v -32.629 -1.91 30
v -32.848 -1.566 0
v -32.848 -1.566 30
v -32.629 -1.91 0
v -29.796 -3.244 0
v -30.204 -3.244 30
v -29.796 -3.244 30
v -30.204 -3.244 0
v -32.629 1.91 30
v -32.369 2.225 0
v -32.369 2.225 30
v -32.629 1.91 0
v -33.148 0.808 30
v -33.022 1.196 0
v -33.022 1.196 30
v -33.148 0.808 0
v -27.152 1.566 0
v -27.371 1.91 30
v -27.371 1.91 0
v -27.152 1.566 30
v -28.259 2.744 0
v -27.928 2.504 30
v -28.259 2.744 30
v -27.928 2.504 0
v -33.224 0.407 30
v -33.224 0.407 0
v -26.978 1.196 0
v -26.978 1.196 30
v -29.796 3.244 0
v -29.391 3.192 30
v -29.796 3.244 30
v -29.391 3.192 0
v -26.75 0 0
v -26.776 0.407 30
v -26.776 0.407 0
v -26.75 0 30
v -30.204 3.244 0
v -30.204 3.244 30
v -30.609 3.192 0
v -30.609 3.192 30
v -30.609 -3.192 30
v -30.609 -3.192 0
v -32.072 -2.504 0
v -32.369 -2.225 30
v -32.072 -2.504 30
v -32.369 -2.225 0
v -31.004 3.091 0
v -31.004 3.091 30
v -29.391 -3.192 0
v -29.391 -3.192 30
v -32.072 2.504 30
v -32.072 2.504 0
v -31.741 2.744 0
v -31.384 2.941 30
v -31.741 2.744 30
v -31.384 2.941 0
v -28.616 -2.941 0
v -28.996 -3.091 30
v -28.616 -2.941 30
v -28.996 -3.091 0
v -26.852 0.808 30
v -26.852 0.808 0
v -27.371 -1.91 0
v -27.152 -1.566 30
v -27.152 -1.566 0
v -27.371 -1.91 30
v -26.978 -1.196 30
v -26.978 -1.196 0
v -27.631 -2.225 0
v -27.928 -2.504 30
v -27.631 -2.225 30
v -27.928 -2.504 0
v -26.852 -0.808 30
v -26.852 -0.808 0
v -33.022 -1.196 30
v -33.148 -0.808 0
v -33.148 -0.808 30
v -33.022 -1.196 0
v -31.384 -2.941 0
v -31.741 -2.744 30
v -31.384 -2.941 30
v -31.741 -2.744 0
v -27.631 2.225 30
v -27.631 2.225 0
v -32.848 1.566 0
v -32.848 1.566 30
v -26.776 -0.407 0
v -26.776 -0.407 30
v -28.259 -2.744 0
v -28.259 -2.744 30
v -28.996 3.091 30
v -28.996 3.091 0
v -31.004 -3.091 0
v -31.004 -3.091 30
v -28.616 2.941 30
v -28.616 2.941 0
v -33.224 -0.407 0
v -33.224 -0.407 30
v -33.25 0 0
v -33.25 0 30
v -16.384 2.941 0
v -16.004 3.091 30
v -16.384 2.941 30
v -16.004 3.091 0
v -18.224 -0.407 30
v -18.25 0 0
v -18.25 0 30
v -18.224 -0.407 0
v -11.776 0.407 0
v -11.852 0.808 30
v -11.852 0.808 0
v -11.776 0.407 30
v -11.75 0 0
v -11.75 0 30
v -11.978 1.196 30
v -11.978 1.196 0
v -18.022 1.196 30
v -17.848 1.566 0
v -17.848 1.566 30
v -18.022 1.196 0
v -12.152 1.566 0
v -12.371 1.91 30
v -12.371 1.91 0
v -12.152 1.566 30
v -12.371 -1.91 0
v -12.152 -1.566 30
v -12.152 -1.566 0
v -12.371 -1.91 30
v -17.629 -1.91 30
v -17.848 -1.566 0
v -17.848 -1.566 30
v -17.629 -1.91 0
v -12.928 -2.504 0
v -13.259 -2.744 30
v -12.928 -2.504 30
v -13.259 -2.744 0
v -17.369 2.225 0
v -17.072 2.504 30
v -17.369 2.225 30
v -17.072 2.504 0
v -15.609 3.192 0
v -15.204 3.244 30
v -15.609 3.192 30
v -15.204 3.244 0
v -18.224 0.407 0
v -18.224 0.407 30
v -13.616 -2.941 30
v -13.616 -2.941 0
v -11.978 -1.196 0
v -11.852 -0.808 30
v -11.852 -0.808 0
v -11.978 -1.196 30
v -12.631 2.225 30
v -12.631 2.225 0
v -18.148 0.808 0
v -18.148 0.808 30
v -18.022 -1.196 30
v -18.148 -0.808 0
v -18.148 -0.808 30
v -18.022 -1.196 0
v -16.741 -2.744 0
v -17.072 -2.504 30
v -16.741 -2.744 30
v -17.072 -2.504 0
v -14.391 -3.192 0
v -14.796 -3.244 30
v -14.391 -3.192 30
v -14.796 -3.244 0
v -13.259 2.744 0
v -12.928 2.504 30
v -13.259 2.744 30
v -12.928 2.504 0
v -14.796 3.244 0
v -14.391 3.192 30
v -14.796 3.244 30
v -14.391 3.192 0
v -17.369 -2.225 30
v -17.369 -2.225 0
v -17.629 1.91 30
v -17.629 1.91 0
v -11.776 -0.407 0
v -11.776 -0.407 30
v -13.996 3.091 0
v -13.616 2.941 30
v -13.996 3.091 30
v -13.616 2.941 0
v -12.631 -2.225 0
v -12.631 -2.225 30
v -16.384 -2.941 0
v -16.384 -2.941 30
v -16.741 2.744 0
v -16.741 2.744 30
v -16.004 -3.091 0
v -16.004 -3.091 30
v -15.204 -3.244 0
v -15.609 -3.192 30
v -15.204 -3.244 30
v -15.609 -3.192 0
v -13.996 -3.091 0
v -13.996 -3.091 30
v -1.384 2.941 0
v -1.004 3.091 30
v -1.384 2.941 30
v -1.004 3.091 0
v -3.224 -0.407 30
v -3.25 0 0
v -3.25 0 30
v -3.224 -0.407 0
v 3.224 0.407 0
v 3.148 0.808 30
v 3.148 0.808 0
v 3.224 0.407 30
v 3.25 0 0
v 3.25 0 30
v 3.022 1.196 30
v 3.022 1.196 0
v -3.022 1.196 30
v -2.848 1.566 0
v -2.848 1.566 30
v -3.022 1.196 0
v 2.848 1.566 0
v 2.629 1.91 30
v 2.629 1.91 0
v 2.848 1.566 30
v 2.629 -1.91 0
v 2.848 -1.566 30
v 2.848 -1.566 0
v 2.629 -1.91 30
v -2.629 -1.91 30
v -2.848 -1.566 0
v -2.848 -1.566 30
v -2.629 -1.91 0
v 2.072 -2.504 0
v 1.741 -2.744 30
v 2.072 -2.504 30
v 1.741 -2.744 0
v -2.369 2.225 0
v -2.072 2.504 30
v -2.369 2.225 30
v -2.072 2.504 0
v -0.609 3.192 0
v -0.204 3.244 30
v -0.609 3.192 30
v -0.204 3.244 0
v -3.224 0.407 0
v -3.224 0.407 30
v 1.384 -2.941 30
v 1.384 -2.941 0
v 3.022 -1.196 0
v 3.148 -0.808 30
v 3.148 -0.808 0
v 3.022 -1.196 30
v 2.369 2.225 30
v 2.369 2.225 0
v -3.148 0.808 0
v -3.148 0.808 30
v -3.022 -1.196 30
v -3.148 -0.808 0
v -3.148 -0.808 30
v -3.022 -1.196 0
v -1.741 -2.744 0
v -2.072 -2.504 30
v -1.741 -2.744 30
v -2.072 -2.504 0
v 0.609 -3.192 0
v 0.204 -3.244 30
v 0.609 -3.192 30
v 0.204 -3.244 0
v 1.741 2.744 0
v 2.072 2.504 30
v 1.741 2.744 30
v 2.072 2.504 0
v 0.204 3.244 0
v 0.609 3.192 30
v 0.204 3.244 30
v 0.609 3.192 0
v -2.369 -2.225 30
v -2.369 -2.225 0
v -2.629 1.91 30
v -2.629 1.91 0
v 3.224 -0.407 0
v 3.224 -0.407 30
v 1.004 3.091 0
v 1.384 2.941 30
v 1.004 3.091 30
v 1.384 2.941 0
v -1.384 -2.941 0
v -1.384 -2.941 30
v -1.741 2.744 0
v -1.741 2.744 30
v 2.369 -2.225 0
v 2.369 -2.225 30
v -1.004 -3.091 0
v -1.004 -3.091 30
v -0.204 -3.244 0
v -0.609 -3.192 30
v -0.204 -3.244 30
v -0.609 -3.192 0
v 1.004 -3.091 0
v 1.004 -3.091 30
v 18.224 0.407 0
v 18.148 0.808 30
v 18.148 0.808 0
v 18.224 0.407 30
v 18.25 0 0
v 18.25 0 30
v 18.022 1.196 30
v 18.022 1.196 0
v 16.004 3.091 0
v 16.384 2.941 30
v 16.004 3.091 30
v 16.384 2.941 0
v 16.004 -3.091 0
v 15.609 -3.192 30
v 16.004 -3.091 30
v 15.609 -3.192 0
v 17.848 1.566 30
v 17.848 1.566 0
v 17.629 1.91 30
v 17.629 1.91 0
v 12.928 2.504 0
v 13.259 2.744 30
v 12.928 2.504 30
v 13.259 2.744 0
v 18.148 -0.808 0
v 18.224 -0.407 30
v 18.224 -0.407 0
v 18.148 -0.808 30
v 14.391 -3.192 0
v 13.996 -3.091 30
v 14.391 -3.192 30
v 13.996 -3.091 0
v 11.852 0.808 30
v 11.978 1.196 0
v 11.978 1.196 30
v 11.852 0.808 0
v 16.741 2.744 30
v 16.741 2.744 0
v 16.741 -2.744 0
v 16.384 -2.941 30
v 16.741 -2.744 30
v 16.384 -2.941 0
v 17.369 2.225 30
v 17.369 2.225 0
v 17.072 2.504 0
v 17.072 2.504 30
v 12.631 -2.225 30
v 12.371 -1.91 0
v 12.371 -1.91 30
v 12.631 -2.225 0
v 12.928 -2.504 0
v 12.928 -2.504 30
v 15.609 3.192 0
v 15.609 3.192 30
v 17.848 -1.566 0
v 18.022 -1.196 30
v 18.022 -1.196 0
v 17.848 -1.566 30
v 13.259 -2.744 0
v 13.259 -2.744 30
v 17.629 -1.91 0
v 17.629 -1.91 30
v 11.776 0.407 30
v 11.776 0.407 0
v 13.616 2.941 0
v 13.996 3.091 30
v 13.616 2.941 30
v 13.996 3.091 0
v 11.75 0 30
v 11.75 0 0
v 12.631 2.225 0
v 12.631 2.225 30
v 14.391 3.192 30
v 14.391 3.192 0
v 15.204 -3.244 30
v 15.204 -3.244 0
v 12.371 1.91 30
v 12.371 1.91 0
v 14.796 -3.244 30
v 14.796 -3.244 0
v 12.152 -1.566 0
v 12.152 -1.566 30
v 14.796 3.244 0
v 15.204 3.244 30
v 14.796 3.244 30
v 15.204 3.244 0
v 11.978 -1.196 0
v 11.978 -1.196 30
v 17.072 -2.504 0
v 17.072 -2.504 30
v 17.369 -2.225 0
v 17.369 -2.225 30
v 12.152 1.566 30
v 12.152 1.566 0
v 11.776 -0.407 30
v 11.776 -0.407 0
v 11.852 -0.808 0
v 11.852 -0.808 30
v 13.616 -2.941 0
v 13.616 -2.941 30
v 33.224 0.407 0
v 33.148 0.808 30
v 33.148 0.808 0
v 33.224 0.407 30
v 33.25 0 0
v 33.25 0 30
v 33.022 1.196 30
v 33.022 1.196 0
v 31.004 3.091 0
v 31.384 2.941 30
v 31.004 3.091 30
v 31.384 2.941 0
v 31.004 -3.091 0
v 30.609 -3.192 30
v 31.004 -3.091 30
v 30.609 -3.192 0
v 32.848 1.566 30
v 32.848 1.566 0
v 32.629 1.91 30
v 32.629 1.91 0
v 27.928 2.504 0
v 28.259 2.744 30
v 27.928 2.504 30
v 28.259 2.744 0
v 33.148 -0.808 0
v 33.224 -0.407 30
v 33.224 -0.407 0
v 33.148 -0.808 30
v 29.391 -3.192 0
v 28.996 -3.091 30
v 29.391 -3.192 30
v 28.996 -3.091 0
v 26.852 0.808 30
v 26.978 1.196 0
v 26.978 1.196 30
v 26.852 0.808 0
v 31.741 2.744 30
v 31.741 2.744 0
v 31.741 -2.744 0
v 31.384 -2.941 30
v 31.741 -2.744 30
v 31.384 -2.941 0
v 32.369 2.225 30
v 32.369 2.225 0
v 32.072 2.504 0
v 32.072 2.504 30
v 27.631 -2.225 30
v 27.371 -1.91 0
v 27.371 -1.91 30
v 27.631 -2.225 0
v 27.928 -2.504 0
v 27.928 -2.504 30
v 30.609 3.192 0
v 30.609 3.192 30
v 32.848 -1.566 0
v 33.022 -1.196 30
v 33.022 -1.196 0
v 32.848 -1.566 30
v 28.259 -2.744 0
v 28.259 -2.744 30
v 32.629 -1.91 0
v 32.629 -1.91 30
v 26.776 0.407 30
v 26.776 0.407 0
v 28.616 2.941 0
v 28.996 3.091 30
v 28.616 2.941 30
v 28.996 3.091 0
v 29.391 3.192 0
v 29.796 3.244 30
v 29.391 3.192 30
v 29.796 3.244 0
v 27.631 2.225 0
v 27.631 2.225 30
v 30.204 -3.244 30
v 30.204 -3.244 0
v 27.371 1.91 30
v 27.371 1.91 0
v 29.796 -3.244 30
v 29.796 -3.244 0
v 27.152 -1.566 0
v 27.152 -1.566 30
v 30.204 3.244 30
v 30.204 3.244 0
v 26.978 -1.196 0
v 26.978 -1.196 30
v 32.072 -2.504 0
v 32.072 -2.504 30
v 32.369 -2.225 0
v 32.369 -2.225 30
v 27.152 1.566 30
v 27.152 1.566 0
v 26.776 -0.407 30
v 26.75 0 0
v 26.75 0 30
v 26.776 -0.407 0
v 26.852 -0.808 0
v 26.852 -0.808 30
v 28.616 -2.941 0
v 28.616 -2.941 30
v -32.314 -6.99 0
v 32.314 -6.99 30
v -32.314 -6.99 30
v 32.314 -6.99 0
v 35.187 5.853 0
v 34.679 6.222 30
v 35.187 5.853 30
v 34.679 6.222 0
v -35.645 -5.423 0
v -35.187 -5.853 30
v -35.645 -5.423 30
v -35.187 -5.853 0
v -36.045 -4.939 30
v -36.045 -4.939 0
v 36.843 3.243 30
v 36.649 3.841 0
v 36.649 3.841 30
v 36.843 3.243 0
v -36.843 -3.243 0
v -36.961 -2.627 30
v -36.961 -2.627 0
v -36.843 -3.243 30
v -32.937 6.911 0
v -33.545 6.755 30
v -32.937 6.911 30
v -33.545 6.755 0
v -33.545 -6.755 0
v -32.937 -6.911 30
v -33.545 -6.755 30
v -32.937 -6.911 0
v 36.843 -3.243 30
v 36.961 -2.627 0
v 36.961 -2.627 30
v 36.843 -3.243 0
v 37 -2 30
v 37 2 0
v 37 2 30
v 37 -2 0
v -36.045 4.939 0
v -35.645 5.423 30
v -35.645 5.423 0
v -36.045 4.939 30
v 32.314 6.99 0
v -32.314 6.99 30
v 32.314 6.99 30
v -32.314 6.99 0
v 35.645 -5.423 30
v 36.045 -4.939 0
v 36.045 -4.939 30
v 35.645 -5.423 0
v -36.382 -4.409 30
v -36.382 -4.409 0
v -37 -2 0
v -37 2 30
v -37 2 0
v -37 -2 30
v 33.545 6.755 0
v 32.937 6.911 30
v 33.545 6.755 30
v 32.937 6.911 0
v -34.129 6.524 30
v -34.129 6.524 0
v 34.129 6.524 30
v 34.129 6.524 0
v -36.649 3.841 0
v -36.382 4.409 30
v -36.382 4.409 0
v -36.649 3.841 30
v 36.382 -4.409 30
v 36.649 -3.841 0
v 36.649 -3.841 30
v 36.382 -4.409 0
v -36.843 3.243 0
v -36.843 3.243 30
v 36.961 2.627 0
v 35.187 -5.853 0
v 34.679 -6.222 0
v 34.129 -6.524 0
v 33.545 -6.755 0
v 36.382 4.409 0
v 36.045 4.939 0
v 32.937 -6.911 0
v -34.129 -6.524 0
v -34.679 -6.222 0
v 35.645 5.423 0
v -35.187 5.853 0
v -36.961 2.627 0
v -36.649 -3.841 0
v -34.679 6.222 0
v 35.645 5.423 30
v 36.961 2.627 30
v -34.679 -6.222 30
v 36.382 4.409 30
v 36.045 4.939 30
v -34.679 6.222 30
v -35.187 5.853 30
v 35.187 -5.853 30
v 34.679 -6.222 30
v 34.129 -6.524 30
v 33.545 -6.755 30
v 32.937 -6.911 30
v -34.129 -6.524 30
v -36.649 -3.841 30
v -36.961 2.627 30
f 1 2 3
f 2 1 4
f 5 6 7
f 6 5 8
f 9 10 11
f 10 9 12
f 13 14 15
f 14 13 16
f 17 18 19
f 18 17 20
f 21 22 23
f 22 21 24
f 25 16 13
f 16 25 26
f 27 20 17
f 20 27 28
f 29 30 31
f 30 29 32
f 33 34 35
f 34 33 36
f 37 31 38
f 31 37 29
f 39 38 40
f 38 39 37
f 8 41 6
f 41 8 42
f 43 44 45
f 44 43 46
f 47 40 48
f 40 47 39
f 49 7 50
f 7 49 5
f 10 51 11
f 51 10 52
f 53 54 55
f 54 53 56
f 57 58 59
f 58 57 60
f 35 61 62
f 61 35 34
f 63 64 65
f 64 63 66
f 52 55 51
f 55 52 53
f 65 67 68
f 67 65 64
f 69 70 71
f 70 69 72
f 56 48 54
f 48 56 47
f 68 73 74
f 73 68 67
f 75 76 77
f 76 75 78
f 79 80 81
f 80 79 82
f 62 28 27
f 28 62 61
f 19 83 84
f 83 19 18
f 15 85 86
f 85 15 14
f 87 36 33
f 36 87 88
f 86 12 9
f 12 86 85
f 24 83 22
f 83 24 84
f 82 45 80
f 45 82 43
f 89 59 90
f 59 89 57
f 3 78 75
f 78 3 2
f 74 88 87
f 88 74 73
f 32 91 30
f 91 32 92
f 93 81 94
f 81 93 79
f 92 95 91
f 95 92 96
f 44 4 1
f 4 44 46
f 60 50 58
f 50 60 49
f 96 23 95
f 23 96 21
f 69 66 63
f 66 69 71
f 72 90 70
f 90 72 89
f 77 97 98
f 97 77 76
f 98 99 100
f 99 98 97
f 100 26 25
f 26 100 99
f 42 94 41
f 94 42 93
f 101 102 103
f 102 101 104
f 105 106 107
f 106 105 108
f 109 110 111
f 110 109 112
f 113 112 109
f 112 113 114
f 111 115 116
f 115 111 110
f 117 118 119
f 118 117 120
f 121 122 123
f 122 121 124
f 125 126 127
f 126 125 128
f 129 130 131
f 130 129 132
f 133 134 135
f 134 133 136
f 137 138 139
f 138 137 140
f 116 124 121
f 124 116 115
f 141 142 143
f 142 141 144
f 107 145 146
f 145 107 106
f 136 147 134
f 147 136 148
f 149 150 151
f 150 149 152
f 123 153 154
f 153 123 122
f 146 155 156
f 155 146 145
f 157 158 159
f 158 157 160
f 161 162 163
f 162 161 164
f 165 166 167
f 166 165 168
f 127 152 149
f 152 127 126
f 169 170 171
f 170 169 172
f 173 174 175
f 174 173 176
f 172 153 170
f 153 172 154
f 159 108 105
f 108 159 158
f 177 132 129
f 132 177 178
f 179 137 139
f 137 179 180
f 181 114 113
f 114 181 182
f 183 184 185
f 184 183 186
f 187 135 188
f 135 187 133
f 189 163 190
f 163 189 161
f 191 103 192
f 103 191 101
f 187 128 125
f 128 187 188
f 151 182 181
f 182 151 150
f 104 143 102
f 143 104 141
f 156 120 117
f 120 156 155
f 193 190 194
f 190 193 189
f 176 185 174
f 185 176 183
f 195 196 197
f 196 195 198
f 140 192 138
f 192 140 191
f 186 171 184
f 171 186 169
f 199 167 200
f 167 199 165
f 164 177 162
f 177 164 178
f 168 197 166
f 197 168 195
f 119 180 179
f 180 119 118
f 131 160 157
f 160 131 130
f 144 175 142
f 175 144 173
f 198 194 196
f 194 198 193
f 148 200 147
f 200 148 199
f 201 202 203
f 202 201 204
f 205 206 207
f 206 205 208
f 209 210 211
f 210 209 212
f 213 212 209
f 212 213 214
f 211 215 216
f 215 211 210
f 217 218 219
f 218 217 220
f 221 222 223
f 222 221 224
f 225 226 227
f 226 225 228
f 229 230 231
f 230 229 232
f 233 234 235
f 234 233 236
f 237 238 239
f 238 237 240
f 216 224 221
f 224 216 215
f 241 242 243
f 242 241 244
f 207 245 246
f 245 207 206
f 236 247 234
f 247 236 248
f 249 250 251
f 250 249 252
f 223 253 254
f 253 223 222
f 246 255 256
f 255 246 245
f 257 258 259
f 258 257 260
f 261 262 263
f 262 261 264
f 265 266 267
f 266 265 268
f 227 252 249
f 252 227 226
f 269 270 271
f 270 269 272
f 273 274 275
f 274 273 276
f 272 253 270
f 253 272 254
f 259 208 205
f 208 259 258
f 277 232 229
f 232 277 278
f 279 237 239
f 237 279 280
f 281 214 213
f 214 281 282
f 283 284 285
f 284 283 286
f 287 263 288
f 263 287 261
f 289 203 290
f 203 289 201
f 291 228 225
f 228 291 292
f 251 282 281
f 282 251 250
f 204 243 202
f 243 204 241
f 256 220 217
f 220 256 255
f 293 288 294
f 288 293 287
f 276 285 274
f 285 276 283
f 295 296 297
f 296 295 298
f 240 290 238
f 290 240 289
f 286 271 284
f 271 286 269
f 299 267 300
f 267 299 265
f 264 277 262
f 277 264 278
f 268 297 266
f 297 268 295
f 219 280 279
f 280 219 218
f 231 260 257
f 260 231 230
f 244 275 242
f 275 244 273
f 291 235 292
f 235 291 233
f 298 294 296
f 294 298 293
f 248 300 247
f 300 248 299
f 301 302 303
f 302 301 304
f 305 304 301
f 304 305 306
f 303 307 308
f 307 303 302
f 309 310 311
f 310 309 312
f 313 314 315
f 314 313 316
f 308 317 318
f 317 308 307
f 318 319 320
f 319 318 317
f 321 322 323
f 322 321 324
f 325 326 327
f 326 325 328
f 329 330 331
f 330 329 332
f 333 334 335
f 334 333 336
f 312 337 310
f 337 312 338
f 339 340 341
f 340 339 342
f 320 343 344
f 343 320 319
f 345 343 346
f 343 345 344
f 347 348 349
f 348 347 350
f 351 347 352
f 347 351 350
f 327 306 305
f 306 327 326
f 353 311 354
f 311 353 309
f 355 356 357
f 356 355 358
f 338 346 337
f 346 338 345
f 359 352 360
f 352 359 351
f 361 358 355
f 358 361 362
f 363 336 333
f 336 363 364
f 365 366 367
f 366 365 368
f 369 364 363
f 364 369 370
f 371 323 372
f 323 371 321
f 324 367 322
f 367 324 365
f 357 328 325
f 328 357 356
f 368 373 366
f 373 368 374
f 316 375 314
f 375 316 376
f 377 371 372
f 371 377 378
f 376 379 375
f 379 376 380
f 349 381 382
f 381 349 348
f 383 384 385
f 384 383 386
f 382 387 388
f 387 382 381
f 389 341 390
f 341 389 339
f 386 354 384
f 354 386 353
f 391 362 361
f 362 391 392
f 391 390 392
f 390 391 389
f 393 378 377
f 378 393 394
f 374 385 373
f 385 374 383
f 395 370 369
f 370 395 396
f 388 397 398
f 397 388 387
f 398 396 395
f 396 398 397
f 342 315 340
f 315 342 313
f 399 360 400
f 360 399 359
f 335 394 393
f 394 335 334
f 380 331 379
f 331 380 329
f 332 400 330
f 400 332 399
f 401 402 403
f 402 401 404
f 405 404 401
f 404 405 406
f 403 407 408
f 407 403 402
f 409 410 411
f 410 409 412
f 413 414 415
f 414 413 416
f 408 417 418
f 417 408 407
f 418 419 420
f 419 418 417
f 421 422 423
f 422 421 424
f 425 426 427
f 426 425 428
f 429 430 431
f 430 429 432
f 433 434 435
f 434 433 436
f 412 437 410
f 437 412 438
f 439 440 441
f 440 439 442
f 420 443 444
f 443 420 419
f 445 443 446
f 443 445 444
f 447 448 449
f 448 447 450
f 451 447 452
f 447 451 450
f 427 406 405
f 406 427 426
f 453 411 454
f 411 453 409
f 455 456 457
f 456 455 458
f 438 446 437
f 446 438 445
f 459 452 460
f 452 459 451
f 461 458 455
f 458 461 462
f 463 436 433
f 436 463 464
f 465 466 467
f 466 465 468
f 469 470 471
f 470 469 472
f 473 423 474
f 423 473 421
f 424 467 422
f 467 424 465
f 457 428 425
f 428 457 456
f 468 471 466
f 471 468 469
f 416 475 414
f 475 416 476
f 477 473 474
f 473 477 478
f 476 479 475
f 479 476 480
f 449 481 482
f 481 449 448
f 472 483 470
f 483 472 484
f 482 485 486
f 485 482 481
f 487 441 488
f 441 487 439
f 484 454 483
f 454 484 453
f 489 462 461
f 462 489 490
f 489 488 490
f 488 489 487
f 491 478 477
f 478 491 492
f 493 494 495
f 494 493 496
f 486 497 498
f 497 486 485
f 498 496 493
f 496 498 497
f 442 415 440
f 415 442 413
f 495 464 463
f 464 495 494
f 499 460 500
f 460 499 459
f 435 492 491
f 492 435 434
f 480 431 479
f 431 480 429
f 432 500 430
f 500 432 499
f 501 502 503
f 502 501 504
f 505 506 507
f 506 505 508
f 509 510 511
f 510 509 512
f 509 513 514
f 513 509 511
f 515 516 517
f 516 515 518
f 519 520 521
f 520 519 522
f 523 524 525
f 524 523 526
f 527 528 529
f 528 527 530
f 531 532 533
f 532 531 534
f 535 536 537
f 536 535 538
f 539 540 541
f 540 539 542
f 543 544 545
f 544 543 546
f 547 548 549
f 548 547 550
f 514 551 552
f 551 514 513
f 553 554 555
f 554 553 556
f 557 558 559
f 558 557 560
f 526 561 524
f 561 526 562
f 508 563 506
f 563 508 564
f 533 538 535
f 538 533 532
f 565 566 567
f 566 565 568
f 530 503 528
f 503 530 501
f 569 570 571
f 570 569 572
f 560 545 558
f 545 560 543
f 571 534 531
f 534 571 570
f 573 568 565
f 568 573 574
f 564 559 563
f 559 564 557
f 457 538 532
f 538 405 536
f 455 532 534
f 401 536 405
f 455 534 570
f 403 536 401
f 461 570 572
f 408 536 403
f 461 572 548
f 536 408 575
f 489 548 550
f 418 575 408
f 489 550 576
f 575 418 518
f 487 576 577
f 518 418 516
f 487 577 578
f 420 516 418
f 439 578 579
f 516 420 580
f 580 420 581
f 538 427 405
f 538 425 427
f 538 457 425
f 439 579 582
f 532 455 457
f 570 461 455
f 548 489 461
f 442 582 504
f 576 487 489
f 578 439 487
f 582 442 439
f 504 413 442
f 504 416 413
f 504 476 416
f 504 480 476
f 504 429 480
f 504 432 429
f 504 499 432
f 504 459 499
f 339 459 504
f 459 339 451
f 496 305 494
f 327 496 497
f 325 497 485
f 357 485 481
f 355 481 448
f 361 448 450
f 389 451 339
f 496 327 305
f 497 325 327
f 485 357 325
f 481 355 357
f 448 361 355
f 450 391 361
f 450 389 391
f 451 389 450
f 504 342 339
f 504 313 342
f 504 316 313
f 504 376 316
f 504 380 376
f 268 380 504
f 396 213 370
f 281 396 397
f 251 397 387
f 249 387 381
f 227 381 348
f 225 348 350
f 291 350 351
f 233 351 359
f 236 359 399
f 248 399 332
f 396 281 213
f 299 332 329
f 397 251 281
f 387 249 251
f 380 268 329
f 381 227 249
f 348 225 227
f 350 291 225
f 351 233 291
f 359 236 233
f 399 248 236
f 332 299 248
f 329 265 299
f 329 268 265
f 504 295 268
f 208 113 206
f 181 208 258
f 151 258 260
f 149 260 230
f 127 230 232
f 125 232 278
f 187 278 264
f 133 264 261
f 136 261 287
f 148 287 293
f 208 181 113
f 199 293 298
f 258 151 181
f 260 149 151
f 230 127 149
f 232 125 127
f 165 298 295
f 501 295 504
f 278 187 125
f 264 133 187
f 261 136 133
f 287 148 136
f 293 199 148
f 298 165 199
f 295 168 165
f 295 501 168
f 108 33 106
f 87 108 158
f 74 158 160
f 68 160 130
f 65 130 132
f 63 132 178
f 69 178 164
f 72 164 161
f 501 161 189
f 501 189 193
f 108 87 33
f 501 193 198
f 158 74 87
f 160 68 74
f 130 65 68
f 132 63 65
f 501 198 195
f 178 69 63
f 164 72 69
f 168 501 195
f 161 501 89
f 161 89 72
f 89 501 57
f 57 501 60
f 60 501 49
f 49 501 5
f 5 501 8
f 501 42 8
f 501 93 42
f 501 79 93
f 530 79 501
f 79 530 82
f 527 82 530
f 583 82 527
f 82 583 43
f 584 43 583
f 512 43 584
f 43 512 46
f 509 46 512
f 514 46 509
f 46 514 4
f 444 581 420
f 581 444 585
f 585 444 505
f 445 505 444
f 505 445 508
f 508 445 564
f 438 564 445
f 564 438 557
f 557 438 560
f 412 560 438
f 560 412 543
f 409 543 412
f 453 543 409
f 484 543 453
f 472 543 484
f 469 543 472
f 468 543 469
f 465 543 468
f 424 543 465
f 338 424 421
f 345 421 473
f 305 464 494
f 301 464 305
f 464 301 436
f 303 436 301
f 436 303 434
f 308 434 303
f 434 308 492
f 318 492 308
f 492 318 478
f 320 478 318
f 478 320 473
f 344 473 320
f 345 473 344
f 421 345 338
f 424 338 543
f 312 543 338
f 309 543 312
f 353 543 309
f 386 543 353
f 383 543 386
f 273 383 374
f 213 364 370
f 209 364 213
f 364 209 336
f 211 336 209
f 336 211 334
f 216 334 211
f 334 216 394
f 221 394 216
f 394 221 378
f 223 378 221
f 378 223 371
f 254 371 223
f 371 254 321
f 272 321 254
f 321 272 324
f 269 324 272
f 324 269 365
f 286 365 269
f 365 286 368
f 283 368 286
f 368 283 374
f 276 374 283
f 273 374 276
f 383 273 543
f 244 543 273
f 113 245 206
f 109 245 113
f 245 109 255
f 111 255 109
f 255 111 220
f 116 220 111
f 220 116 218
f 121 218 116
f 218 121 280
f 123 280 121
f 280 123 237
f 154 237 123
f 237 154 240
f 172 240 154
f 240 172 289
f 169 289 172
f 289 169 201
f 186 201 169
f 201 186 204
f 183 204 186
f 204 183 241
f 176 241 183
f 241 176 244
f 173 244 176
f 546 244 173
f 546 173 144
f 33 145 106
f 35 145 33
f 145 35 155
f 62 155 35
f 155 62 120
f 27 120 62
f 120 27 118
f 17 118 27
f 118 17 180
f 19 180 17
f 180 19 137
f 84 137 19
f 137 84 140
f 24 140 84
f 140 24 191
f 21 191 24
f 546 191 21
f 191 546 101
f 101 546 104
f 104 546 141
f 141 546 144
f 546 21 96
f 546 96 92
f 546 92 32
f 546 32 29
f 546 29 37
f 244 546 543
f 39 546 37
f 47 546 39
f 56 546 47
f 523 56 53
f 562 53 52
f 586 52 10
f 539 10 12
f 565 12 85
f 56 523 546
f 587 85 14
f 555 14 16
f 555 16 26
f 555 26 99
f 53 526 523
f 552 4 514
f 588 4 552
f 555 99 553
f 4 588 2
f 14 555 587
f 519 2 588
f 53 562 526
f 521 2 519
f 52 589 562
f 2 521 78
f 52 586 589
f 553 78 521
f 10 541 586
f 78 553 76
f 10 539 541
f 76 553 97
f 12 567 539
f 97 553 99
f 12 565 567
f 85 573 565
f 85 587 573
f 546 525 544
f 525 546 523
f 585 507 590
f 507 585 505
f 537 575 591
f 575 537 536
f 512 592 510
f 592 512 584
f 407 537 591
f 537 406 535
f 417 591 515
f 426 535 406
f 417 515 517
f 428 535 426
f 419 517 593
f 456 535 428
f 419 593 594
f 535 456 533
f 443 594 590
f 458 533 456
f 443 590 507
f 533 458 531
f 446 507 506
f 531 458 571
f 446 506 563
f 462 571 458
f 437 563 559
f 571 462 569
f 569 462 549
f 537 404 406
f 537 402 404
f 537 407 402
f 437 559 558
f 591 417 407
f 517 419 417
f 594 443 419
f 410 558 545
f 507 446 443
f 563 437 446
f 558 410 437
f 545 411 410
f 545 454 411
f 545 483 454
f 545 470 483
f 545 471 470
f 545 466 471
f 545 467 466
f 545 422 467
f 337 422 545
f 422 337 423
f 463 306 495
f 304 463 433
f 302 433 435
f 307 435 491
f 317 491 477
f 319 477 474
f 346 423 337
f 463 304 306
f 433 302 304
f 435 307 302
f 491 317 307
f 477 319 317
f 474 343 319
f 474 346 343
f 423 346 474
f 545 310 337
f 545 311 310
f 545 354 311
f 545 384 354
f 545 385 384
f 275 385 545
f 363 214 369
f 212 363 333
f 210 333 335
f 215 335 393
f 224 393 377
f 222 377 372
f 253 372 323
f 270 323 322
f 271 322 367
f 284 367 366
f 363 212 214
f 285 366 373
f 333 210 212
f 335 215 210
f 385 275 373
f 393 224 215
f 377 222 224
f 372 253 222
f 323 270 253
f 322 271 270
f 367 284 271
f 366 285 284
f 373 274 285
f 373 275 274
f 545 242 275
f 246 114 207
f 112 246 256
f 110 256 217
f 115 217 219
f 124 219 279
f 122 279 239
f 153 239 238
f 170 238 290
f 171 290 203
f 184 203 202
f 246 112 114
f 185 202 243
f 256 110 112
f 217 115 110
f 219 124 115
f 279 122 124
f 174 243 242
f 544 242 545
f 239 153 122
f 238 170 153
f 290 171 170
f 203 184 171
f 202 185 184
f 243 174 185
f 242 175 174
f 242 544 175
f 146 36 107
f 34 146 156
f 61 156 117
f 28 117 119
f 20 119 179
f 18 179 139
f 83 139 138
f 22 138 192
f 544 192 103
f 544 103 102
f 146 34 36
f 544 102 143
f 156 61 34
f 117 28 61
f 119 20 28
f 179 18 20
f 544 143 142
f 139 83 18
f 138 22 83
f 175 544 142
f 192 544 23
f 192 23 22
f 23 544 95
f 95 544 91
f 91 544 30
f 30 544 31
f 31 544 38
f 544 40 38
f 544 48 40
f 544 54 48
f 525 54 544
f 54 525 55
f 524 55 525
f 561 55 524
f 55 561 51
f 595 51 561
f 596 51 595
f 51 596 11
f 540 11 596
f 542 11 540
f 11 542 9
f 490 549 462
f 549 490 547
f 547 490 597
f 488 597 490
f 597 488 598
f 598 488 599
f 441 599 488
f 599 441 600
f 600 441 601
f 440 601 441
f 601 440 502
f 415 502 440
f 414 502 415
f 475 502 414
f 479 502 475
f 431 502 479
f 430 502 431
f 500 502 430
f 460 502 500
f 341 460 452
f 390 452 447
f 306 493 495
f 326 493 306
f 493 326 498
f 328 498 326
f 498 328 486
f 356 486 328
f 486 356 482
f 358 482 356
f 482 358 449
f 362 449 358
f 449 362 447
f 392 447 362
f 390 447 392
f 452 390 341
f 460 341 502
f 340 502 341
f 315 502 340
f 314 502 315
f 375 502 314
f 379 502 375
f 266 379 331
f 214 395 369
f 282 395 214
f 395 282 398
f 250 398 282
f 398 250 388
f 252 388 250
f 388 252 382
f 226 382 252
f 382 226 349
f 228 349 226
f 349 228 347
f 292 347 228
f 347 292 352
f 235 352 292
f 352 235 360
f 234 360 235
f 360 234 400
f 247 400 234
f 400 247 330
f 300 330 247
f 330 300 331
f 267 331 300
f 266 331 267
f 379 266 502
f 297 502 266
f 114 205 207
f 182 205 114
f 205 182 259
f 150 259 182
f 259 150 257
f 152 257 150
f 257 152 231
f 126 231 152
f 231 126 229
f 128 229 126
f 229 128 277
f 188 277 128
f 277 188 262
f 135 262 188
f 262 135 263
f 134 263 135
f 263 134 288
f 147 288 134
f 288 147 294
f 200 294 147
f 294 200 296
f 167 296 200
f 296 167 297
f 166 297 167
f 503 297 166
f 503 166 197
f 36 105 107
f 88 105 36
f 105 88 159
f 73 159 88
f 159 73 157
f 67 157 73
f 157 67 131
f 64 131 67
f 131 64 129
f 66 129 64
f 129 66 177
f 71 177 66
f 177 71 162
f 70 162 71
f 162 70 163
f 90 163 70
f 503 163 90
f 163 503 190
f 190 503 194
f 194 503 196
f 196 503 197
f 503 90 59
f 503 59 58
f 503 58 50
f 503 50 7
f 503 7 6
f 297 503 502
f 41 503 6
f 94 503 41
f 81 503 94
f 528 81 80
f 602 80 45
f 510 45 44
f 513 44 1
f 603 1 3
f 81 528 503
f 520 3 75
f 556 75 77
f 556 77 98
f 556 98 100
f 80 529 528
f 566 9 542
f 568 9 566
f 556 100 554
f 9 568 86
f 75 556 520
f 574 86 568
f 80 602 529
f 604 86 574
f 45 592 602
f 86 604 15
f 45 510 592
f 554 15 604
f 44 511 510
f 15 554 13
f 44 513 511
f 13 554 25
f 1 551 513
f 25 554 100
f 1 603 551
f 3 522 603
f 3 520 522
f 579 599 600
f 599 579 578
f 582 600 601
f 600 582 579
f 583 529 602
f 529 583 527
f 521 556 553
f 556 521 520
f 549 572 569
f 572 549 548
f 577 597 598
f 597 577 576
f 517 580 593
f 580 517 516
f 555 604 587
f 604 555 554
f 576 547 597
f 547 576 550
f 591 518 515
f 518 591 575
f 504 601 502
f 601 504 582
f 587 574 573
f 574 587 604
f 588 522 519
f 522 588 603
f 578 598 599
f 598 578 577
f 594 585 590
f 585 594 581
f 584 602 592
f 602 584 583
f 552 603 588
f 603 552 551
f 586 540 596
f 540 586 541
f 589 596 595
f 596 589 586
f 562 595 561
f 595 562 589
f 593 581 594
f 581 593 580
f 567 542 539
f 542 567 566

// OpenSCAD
$fn = 50;


difference() {
	union() {
		hull() {
			translate(v = [-32.0000000000, 2.0000000000, 0]) {
				cylinder(h = 30, r = 5);
			}
			translate(v = [32.0000000000, 2.0000000000, 0]) {
				cylinder(h = 30, r = 5);
			}
			translate(v = [-32.0000000000, -2.0000000000, 0]) {
				cylinder(h = 30, r = 5);
			}
			translate(v = [32.0000000000, -2.0000000000, 0]) {
				cylinder(h = 30, r = 5);
			}
		}
	}
	union() {
		translate(v = [-30.0000000000, 0.0000000000, -100.0000000000]) {
			cylinder(h = 200, r = 3.2500000000);
		}
		translate(v = [-15.0000000000, 0.0000000000, -100.0000000000]) {
			cylinder(h = 200, r = 3.2500000000);
		}
		translate(v = [0.0000000000, 0.0000000000, -100.0000000000]) {
			cylinder(h = 200, r = 3.2500000000);
		}
		translate(v = [15.0000000000, 0.0000000000, -100.0000000000]) {
			cylinder(h = 200, r = 3.2500000000);
		}
		translate(v = [30.0000000000, 0.0000000000, -100.0000000000]) {
			cylinder(h = 200, r = 3.2500000000);
		}
	}
}
